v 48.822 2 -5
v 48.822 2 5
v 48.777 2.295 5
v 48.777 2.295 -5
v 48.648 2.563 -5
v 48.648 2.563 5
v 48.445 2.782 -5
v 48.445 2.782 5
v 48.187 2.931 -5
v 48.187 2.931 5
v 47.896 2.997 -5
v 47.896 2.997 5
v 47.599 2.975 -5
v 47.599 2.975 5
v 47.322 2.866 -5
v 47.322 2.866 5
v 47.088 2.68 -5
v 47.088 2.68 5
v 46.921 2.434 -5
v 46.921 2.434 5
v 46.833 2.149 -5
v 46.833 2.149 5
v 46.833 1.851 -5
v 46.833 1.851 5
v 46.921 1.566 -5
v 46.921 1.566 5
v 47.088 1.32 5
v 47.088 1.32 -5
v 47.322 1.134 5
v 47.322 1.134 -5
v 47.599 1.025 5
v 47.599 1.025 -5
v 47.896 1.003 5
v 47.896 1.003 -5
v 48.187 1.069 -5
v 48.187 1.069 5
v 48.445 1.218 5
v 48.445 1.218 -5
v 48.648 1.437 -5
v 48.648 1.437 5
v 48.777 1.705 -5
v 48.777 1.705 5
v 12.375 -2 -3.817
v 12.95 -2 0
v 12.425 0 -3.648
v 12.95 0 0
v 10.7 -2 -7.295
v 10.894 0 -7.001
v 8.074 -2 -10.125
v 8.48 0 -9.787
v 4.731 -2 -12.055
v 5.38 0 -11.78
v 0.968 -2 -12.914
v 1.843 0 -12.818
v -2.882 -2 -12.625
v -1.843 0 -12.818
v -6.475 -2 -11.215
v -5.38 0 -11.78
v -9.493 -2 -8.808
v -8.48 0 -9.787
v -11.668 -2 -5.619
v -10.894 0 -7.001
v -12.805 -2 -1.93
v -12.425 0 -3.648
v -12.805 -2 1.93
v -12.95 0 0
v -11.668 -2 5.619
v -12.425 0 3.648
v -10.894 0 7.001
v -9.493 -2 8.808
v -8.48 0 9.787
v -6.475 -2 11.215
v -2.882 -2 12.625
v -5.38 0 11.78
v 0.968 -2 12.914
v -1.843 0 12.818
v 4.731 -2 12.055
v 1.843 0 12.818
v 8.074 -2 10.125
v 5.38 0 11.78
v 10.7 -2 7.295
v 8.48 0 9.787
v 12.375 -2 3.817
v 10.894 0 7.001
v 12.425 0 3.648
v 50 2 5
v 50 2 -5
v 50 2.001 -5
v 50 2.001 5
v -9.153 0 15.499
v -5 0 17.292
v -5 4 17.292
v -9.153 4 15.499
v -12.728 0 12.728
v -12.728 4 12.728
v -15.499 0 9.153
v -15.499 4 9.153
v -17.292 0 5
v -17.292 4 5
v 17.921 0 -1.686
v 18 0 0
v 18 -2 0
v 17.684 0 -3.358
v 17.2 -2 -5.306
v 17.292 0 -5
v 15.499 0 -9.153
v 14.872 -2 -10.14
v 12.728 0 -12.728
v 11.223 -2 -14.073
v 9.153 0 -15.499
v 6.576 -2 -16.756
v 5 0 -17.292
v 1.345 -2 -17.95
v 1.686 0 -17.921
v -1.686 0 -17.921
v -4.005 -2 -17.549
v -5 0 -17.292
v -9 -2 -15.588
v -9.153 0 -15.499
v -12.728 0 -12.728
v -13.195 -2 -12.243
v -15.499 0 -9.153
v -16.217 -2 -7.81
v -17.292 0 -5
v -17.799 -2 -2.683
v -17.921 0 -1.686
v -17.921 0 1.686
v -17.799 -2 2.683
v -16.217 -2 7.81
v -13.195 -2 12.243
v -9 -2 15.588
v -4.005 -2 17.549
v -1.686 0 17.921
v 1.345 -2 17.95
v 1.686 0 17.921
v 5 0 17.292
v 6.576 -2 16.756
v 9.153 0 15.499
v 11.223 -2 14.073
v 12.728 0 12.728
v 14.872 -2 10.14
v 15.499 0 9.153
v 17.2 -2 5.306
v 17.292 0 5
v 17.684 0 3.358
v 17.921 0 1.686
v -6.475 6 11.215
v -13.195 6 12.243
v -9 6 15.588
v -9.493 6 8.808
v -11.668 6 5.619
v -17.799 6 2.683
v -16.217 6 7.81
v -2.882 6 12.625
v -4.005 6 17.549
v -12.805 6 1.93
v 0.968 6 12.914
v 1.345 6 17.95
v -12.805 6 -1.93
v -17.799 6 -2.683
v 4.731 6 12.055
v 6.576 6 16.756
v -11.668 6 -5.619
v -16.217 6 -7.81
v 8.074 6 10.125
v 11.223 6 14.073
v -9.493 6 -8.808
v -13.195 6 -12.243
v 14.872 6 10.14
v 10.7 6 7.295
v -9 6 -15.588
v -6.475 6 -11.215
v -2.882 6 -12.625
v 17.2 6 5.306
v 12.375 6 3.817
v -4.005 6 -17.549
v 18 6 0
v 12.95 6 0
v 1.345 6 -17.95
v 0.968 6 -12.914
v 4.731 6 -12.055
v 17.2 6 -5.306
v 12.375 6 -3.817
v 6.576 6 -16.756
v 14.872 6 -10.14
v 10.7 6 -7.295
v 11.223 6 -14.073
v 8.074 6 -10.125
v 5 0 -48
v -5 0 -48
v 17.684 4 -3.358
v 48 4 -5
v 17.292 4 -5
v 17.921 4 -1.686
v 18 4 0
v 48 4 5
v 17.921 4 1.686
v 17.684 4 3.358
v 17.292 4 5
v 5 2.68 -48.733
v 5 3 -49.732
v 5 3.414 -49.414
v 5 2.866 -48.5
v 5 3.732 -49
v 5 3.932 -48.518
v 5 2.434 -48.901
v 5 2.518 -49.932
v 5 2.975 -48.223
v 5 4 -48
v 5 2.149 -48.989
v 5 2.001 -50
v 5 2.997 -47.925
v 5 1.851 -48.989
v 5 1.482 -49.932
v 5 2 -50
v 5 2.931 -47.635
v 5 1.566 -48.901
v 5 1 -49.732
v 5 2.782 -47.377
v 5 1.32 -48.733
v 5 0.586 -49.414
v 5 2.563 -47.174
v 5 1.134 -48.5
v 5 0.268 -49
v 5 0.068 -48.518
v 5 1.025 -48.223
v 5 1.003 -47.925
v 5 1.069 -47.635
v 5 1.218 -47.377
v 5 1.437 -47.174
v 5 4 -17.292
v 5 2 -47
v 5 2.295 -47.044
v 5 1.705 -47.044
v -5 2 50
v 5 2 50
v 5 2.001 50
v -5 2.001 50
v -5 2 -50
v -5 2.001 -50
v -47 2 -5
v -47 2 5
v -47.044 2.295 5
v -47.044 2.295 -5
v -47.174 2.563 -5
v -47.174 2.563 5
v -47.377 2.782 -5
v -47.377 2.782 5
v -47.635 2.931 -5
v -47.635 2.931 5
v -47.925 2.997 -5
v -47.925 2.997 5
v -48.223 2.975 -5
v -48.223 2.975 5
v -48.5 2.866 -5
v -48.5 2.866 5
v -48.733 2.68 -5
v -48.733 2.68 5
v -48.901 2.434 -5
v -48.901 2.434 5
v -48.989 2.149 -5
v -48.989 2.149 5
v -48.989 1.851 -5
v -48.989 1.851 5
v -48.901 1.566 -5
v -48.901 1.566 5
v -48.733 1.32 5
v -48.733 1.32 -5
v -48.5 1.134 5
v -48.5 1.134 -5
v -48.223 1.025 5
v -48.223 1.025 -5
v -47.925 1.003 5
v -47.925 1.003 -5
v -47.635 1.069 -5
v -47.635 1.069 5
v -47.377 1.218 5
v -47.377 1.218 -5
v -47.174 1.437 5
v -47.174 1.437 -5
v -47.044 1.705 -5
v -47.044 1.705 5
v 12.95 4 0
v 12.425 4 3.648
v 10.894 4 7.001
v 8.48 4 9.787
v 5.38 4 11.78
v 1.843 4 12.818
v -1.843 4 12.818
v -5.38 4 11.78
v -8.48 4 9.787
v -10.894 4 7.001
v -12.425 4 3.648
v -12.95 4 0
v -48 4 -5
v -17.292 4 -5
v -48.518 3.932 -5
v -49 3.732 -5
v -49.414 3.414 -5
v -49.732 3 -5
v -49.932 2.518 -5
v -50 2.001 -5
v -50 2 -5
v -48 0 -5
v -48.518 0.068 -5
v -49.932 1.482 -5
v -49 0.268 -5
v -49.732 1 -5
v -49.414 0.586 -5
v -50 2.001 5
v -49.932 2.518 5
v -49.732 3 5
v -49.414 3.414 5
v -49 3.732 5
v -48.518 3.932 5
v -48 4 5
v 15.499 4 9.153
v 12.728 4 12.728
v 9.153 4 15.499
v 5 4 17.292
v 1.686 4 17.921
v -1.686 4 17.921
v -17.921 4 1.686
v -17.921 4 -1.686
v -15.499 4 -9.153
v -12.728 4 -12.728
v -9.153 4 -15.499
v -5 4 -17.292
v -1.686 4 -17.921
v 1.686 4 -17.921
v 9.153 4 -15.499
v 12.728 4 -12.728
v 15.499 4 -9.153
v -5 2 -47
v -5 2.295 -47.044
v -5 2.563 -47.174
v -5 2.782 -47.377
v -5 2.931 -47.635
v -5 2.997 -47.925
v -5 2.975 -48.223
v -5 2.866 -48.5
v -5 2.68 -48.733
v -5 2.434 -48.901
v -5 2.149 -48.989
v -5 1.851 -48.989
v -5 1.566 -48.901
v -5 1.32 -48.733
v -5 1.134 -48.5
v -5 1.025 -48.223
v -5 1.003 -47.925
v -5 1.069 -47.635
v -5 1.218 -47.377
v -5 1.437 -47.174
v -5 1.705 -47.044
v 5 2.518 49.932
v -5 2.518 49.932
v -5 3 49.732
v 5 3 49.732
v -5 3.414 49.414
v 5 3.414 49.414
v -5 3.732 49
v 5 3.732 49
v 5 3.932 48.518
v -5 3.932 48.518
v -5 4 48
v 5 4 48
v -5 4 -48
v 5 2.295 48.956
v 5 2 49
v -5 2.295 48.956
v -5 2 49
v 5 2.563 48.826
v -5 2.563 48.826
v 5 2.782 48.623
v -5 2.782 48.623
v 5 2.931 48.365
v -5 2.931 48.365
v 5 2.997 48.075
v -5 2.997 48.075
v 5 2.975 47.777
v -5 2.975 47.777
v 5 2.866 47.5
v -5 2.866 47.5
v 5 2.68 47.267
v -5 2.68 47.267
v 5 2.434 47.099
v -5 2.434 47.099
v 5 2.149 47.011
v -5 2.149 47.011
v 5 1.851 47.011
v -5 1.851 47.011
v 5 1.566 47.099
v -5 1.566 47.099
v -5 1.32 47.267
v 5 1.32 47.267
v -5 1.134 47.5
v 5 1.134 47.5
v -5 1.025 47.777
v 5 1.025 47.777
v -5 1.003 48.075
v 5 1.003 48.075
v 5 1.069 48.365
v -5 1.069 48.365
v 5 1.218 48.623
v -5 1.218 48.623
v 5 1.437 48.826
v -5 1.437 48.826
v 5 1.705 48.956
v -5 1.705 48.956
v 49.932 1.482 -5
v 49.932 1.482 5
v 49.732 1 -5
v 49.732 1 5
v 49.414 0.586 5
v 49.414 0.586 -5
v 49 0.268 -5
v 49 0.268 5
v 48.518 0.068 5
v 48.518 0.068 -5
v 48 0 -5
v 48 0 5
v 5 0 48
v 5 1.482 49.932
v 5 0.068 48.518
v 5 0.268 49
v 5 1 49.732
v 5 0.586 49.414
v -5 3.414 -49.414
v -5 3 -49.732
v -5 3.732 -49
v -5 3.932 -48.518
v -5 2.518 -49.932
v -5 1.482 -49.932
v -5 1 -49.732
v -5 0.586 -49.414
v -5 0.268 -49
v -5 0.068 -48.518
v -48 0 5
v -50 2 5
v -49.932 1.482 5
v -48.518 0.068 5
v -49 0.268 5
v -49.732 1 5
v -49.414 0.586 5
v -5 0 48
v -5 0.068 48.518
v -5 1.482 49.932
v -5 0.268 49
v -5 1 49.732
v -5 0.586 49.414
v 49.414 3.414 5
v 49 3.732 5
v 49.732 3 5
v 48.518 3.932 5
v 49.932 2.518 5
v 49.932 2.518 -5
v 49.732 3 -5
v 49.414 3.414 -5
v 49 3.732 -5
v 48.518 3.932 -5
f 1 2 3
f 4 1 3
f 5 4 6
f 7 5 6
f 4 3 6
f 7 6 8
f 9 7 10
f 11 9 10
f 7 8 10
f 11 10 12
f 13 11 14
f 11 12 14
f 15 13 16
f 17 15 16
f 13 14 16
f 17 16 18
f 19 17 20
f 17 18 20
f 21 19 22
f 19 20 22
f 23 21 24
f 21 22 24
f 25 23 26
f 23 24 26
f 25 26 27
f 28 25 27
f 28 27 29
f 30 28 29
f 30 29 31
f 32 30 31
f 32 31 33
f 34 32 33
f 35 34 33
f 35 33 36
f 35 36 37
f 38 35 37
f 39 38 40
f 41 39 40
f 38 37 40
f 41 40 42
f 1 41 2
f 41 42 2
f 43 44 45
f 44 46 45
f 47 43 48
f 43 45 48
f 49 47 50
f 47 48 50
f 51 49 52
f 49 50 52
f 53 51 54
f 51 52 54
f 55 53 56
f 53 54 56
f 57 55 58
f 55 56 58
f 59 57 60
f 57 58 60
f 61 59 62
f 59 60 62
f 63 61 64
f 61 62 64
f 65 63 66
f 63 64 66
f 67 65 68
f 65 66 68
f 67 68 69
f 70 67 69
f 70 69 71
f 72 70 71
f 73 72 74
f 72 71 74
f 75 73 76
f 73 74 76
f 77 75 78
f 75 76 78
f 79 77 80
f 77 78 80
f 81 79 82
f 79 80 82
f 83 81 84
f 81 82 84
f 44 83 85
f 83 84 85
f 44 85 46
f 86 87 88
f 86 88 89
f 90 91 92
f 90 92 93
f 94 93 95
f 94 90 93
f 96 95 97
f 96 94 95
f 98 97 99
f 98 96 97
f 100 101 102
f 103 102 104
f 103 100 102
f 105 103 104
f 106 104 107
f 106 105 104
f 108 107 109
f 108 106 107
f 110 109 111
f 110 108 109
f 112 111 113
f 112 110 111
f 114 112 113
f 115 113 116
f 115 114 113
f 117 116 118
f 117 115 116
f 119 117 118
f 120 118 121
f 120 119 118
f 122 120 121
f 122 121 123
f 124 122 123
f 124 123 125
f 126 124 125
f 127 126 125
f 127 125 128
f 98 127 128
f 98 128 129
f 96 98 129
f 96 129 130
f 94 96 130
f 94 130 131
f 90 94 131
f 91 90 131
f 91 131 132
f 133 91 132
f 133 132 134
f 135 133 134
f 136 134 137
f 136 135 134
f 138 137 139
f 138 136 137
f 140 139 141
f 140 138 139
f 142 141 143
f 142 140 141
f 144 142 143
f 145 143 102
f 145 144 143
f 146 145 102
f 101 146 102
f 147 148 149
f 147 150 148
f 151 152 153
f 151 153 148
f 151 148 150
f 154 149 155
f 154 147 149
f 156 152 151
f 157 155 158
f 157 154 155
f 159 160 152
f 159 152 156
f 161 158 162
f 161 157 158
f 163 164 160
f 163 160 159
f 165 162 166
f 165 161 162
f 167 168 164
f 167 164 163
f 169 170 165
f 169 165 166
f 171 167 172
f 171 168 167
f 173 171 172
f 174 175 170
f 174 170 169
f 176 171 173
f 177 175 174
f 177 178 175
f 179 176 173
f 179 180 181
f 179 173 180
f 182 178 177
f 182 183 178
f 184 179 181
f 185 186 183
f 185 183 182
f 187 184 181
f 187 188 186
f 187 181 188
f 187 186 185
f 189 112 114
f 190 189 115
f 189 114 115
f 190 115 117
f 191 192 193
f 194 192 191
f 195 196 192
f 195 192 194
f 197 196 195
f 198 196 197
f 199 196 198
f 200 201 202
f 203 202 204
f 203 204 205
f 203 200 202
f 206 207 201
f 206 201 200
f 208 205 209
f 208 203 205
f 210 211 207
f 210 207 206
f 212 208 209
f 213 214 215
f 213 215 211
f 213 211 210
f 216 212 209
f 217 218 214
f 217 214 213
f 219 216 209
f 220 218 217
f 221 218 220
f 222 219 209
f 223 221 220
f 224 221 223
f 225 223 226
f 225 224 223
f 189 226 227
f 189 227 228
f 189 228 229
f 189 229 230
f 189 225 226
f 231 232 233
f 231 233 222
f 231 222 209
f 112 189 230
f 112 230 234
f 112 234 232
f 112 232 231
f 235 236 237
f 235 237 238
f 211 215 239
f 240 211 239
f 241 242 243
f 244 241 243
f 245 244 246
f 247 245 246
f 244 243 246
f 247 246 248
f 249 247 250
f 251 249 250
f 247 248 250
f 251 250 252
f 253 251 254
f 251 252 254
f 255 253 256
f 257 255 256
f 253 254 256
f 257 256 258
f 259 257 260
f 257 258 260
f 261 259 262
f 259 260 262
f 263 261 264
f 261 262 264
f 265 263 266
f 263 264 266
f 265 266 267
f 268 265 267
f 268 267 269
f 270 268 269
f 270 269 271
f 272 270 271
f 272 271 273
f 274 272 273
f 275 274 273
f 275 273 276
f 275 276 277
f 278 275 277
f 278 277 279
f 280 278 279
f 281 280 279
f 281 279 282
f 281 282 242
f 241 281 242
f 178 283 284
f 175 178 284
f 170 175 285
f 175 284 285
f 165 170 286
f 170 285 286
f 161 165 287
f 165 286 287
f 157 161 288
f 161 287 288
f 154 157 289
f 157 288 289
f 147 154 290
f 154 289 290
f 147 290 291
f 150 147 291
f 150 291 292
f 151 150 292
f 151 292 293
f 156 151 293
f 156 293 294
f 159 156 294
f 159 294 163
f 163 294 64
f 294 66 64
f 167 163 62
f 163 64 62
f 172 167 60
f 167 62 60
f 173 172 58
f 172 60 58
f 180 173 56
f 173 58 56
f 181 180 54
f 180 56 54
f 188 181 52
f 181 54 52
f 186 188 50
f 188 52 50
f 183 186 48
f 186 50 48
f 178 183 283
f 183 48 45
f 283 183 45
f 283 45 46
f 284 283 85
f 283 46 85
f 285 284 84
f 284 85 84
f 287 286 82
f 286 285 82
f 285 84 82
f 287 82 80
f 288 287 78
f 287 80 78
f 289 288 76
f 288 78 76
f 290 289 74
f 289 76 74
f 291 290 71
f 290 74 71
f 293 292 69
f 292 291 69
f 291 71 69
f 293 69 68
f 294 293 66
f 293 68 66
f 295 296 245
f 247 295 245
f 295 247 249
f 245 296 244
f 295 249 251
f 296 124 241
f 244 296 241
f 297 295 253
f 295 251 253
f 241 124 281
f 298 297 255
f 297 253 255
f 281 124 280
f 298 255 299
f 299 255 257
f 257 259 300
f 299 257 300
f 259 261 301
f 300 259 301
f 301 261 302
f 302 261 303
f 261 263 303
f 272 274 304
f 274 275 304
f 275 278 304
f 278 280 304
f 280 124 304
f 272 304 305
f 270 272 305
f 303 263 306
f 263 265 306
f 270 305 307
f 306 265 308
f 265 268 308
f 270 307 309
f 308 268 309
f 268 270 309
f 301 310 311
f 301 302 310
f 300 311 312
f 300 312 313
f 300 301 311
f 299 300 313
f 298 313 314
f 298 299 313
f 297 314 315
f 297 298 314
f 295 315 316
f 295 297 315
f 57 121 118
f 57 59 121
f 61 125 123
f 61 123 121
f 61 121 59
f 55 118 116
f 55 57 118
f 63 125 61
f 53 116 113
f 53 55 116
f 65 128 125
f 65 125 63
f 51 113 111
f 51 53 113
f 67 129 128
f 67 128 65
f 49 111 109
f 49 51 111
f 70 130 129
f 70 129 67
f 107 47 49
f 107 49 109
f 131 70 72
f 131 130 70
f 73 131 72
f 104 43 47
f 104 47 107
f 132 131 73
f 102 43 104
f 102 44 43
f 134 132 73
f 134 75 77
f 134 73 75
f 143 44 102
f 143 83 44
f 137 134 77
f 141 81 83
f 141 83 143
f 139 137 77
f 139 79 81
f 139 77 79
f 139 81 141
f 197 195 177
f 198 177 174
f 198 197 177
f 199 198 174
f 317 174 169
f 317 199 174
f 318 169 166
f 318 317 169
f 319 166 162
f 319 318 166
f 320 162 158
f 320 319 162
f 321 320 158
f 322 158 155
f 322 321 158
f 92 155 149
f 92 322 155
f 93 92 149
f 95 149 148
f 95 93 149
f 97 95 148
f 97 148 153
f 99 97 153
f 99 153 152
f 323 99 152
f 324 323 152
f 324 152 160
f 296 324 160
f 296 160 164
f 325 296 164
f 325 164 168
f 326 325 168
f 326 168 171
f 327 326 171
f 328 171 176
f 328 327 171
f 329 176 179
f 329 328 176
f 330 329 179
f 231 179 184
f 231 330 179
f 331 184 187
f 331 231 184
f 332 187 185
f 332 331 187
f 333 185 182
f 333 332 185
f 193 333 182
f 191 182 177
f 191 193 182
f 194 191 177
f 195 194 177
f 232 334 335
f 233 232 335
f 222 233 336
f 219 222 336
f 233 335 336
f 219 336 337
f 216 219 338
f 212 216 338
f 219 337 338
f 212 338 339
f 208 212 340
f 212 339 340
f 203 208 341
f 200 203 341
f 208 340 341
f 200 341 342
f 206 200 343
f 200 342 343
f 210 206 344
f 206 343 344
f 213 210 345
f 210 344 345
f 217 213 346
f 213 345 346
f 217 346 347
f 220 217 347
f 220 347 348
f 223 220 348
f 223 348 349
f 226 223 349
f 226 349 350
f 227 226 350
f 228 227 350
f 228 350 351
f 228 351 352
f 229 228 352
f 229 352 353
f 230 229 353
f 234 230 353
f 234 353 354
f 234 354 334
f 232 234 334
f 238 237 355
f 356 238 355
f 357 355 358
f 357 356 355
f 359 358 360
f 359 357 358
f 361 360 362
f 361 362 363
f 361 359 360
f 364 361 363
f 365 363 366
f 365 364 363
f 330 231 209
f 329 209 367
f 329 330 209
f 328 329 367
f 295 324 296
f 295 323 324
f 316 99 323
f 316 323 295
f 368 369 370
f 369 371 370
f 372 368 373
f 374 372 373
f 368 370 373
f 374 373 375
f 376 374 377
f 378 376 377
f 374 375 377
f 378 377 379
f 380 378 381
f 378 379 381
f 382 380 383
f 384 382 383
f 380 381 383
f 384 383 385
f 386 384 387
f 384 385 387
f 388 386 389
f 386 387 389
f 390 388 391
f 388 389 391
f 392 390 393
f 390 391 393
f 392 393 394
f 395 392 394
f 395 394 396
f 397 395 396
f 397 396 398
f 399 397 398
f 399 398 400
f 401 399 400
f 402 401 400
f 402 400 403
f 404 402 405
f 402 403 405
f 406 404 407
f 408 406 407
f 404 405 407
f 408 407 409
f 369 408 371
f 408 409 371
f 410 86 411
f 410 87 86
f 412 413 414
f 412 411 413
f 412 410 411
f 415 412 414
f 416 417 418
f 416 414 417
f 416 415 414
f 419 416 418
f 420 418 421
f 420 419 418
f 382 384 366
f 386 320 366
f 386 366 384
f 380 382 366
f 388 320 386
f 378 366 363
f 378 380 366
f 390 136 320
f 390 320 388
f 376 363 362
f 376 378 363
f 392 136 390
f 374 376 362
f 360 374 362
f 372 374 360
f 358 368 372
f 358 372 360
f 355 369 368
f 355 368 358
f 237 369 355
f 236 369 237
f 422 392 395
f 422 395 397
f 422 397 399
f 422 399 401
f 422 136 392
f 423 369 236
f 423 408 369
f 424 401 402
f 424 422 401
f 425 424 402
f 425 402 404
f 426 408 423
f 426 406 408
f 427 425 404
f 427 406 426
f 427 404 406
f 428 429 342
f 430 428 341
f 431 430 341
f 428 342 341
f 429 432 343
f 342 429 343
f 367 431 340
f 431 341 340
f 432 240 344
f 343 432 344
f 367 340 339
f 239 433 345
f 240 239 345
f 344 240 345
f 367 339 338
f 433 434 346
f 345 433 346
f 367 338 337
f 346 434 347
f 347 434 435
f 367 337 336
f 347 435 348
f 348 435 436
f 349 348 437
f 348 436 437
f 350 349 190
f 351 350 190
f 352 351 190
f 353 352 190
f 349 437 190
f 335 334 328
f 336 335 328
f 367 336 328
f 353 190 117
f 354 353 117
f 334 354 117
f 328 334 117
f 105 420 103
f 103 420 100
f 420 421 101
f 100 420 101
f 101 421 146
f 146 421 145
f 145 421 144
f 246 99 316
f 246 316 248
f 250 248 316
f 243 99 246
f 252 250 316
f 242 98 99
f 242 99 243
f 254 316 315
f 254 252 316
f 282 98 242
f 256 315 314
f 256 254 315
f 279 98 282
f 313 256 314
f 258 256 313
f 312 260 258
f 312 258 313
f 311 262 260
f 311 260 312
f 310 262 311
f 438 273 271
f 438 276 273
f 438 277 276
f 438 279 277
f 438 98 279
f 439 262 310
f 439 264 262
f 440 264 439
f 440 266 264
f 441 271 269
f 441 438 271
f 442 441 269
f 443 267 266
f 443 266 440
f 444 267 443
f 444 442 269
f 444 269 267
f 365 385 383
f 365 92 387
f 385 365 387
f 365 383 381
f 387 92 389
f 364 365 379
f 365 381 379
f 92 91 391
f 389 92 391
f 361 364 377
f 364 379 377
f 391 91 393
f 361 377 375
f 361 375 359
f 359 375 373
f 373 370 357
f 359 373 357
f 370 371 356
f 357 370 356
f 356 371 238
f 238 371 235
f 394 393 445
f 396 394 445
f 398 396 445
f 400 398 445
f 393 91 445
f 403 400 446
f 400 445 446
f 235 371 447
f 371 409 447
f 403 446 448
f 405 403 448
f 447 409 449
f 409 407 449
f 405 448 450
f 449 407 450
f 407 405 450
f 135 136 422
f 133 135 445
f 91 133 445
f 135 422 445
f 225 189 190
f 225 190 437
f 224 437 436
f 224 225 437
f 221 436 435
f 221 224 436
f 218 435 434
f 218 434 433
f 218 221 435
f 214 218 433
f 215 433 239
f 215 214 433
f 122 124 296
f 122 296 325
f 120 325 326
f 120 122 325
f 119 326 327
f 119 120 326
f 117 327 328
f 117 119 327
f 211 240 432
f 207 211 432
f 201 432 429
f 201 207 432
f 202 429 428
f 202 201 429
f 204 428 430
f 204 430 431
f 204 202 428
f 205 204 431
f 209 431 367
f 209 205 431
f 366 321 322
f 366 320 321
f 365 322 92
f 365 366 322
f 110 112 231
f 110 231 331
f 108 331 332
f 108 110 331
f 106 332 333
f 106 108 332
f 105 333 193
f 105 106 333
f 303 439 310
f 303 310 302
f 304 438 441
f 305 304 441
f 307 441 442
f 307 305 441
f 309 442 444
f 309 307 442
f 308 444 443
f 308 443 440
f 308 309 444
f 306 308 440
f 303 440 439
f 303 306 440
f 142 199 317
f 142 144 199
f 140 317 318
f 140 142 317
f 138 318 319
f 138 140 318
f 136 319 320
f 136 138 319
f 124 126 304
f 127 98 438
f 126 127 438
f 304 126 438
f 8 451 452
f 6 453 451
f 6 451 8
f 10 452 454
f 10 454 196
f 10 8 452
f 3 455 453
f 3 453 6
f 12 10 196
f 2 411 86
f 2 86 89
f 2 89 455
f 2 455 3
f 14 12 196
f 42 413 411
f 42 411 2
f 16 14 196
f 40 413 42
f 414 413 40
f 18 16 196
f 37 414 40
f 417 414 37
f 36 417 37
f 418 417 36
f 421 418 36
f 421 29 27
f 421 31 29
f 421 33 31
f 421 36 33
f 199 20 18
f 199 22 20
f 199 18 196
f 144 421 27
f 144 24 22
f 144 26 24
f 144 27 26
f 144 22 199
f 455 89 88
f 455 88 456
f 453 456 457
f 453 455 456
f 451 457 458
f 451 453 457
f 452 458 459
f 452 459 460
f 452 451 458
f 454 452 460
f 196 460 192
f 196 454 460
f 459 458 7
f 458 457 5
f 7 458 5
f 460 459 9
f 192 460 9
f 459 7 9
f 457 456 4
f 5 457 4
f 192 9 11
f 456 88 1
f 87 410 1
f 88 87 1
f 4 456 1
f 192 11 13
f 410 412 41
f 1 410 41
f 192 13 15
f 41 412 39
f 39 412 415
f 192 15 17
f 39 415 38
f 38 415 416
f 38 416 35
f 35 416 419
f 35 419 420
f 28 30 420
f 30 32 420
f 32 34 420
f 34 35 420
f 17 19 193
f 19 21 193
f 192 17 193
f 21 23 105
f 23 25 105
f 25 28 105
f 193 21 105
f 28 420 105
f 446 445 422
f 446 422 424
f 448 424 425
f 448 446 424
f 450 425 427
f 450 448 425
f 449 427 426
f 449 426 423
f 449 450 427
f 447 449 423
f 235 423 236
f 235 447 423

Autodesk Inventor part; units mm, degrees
ref_plane "YZ Plane" through (0, 0, 0) normal (1, 0, 0) x (0, 1, 0)
ref_plane "XZ Plane" through (0, 0, 0) normal (0, 1, 0) x (-1, 0, 0)
ref_plane "XY Plane" through (0, 0, 0) normal (0, 0, 1) x (1, 0, 0)
sketch "Boceto1" plane through (0, 0, 0) normal (0, 1, 0) x (-1, 0, 0)
  circle A0 centre (0, 0) radius 50 construction
  line L0 (-28.7316, 0) -> (21.6034, 0) construction
  circle A1 centre (0, 0) radius 12.95
  line L1 (50, 0) -> (-50, 0) construction
  line L2 (-50, 0) -> (-50, 5)
  line L3 (50, 5) -> (50, 0)
  line L4 (-50, 0) -> (-50, -5)
  line L5 (50, -5) -> (50, 0)
  line L6 (-50, -5) -> (-17.2916, -5)
  line L7 (17.2916, -5) -> (50, -5)
  line L8 (-50, 5) -> (-17.2916, 5)
  line L9 (17.2916, 5) -> (50, 5)
  line L10 (0, 50) -> (0, -50) construction
  line L11 (0, -50) -> (-5, -50)
  line L12 (-5, 50) -> (0, 50)
  line L13 (0, -50) -> (5, -50)
  line L14 (5, 50) -> (0, 50)
  arc A2 (-17.2916, -5) -> (-5, -17.2916) centre (0, 0) ccw
  arc A3 (5, -17.2916) -> (17.2916, -5) centre (0, 0) ccw
  arc A4 (17.2916, 5) -> (5, 17.2916) centre (0, 0) ccw
  arc A5 (-5, 17.2916) -> (-17.2916, 5) centre (0, 0) ccw
  line L15 (-5, -50) -> (-5, -17.2916)
  line L16 (-5, 17.2916) -> (-5, 50)
  line L17 (5, 17.2916) -> (5, 50)
  line L18 (5, -50) -> (5, -17.2916)
  dimension "d2" = 100
  dimension "d3" = 25.9
  dimension "d5" = 5
  dimension "d6" = 5
extrude "Extrusión1" add sketch "Boceto1" along normal blind 4
sketch "Boceto2" plane through (0, 4, 0) normal (0, 1, 0) x (1, 0, 0)
  circle A0 centre (0, 0) radius 18
  circle A1 centre (0, 0) radius 12.95
  dimension "d9" = 36
  dimension "d10" = 25.9
extrude "Extrusión2" add sketch "Boceto2" along normal blind 2
sketch "Boceto3" plane through (0, 0, 0) normal (0, -1, 0) x (1, 0, 0)
  circle A0 centre (0, 0) radius 18
  circle A1 centre (0, 0) radius 12.95
  dimension "d13" = 36
  dimension "d14" = 25.9
extrude "Extrusión3" add sketch "Boceto3" along normal blind 2
sketch "Boceto4" plane through (0, 4, 0) normal (0, 1, 0) x (1, 0, 0)
  point P0 (0, 0)
sketch "Boceto5" plane through (-5, 0, 50) normal (0, 0, 1) x (1, 0, 0)
  point P0 (5, 0)
sketch "Boceto6" plane through (-5, 0, 17.2916) normal (-1, 0, 0) x (0, 0, 1)
  line L0 (-67.2916, 4) -> (-63.2916, 4) construction
  line L1 (-63.2916, 4) -> (-63.2916, 0) construction
  line L2 (-63.2916, 0) -> (-67.2916, 0) construction
  line L3 (-67.2916, 0) -> (-67.2916, 4) construction
  line L4 (32.7084, 4) -> (0, 4) construction
  line L5 (32.7084, 4) -> (28.7084, 4)
  line L6 (28.7084, 4) -> (28.7084, 0) construction
  line L7 (28.7084, 0) -> (32.7084, 0) construction
  line L8 (32.7084, 0) -> (32.7084, 4) construction
  circle A0 centre (30.7084, 2) radius 1
  circle A1 centre (-65.2916, 2) radius 1
  point P0 (-17.2916, 0)
  dimension "d17" = 4
  dimension "d18" = 4
  dimension "d19" = 4
  dimension "d20" = 4
  dimension "d21" = 2
  dimension "d22" = 2
extrude "Extrusión4" cut sketch "Boceto6" against normal through all
sketch "Boceto7" plane through (17.2916, 0, 5) normal (0, 0, 1) x (1, 0, 0)
  line L0 (-34.5832, 4) -> (-67.2916, 4) construction
  line L1 (-67.2916, 4) -> (-63.2916, 4)
  line L2 (-63.2916, 4) -> (-63.2916, 0) construction
  line L3 (-63.2916, 0) -> (-67.2916, 0) construction
  line L4 (-67.2916, 0) -> (-67.2916, 4) construction
  circle A0 centre (-65.2916, 2) radius 1
  line L5 (32.7084, 4) -> (0, 4) construction
  line L6 (32.7084, 4) -> (28.7084, 4)
  line L7 (28.7084, 4) -> (28.7084, 0) construction
  line L8 (28.7084, 0) -> (32.7084, 0) construction
  line L9 (32.7084, 0) -> (32.7084, 4) construction
  circle A1 centre (30.5299, 2) radius 1
  point P0 (-17.2916, 0)
  dimension "d25" = 4
  dimension "d26" = 4
  dimension "d27" = 2
  dimension "d28" = 4
  dimension "d29" = 4
  dimension "d30" = 2
extrude "Extrusión5" cut sketch "Boceto7" against normal through all
fillet "Empalme1" radius 2 8 edges at (-50, 4, 0) (-50, 0, 0) (0, 4, 50) (0, 0, 50) (50, 4, 0) (50, 0, 0) (0, 4, -50) (0, 0, -50)
sketch "Boceto8" plane through (-17.2916, 0, 5) normal (0, 0, 1) x (1, 0, 0)
  point P0 (17.2916, 0)
sketch "Boceto9" plane through (5, 0, 17.2916) normal (1, 0, 0) x (0, 0, -1)
  point P0 (17.2916, 0)
